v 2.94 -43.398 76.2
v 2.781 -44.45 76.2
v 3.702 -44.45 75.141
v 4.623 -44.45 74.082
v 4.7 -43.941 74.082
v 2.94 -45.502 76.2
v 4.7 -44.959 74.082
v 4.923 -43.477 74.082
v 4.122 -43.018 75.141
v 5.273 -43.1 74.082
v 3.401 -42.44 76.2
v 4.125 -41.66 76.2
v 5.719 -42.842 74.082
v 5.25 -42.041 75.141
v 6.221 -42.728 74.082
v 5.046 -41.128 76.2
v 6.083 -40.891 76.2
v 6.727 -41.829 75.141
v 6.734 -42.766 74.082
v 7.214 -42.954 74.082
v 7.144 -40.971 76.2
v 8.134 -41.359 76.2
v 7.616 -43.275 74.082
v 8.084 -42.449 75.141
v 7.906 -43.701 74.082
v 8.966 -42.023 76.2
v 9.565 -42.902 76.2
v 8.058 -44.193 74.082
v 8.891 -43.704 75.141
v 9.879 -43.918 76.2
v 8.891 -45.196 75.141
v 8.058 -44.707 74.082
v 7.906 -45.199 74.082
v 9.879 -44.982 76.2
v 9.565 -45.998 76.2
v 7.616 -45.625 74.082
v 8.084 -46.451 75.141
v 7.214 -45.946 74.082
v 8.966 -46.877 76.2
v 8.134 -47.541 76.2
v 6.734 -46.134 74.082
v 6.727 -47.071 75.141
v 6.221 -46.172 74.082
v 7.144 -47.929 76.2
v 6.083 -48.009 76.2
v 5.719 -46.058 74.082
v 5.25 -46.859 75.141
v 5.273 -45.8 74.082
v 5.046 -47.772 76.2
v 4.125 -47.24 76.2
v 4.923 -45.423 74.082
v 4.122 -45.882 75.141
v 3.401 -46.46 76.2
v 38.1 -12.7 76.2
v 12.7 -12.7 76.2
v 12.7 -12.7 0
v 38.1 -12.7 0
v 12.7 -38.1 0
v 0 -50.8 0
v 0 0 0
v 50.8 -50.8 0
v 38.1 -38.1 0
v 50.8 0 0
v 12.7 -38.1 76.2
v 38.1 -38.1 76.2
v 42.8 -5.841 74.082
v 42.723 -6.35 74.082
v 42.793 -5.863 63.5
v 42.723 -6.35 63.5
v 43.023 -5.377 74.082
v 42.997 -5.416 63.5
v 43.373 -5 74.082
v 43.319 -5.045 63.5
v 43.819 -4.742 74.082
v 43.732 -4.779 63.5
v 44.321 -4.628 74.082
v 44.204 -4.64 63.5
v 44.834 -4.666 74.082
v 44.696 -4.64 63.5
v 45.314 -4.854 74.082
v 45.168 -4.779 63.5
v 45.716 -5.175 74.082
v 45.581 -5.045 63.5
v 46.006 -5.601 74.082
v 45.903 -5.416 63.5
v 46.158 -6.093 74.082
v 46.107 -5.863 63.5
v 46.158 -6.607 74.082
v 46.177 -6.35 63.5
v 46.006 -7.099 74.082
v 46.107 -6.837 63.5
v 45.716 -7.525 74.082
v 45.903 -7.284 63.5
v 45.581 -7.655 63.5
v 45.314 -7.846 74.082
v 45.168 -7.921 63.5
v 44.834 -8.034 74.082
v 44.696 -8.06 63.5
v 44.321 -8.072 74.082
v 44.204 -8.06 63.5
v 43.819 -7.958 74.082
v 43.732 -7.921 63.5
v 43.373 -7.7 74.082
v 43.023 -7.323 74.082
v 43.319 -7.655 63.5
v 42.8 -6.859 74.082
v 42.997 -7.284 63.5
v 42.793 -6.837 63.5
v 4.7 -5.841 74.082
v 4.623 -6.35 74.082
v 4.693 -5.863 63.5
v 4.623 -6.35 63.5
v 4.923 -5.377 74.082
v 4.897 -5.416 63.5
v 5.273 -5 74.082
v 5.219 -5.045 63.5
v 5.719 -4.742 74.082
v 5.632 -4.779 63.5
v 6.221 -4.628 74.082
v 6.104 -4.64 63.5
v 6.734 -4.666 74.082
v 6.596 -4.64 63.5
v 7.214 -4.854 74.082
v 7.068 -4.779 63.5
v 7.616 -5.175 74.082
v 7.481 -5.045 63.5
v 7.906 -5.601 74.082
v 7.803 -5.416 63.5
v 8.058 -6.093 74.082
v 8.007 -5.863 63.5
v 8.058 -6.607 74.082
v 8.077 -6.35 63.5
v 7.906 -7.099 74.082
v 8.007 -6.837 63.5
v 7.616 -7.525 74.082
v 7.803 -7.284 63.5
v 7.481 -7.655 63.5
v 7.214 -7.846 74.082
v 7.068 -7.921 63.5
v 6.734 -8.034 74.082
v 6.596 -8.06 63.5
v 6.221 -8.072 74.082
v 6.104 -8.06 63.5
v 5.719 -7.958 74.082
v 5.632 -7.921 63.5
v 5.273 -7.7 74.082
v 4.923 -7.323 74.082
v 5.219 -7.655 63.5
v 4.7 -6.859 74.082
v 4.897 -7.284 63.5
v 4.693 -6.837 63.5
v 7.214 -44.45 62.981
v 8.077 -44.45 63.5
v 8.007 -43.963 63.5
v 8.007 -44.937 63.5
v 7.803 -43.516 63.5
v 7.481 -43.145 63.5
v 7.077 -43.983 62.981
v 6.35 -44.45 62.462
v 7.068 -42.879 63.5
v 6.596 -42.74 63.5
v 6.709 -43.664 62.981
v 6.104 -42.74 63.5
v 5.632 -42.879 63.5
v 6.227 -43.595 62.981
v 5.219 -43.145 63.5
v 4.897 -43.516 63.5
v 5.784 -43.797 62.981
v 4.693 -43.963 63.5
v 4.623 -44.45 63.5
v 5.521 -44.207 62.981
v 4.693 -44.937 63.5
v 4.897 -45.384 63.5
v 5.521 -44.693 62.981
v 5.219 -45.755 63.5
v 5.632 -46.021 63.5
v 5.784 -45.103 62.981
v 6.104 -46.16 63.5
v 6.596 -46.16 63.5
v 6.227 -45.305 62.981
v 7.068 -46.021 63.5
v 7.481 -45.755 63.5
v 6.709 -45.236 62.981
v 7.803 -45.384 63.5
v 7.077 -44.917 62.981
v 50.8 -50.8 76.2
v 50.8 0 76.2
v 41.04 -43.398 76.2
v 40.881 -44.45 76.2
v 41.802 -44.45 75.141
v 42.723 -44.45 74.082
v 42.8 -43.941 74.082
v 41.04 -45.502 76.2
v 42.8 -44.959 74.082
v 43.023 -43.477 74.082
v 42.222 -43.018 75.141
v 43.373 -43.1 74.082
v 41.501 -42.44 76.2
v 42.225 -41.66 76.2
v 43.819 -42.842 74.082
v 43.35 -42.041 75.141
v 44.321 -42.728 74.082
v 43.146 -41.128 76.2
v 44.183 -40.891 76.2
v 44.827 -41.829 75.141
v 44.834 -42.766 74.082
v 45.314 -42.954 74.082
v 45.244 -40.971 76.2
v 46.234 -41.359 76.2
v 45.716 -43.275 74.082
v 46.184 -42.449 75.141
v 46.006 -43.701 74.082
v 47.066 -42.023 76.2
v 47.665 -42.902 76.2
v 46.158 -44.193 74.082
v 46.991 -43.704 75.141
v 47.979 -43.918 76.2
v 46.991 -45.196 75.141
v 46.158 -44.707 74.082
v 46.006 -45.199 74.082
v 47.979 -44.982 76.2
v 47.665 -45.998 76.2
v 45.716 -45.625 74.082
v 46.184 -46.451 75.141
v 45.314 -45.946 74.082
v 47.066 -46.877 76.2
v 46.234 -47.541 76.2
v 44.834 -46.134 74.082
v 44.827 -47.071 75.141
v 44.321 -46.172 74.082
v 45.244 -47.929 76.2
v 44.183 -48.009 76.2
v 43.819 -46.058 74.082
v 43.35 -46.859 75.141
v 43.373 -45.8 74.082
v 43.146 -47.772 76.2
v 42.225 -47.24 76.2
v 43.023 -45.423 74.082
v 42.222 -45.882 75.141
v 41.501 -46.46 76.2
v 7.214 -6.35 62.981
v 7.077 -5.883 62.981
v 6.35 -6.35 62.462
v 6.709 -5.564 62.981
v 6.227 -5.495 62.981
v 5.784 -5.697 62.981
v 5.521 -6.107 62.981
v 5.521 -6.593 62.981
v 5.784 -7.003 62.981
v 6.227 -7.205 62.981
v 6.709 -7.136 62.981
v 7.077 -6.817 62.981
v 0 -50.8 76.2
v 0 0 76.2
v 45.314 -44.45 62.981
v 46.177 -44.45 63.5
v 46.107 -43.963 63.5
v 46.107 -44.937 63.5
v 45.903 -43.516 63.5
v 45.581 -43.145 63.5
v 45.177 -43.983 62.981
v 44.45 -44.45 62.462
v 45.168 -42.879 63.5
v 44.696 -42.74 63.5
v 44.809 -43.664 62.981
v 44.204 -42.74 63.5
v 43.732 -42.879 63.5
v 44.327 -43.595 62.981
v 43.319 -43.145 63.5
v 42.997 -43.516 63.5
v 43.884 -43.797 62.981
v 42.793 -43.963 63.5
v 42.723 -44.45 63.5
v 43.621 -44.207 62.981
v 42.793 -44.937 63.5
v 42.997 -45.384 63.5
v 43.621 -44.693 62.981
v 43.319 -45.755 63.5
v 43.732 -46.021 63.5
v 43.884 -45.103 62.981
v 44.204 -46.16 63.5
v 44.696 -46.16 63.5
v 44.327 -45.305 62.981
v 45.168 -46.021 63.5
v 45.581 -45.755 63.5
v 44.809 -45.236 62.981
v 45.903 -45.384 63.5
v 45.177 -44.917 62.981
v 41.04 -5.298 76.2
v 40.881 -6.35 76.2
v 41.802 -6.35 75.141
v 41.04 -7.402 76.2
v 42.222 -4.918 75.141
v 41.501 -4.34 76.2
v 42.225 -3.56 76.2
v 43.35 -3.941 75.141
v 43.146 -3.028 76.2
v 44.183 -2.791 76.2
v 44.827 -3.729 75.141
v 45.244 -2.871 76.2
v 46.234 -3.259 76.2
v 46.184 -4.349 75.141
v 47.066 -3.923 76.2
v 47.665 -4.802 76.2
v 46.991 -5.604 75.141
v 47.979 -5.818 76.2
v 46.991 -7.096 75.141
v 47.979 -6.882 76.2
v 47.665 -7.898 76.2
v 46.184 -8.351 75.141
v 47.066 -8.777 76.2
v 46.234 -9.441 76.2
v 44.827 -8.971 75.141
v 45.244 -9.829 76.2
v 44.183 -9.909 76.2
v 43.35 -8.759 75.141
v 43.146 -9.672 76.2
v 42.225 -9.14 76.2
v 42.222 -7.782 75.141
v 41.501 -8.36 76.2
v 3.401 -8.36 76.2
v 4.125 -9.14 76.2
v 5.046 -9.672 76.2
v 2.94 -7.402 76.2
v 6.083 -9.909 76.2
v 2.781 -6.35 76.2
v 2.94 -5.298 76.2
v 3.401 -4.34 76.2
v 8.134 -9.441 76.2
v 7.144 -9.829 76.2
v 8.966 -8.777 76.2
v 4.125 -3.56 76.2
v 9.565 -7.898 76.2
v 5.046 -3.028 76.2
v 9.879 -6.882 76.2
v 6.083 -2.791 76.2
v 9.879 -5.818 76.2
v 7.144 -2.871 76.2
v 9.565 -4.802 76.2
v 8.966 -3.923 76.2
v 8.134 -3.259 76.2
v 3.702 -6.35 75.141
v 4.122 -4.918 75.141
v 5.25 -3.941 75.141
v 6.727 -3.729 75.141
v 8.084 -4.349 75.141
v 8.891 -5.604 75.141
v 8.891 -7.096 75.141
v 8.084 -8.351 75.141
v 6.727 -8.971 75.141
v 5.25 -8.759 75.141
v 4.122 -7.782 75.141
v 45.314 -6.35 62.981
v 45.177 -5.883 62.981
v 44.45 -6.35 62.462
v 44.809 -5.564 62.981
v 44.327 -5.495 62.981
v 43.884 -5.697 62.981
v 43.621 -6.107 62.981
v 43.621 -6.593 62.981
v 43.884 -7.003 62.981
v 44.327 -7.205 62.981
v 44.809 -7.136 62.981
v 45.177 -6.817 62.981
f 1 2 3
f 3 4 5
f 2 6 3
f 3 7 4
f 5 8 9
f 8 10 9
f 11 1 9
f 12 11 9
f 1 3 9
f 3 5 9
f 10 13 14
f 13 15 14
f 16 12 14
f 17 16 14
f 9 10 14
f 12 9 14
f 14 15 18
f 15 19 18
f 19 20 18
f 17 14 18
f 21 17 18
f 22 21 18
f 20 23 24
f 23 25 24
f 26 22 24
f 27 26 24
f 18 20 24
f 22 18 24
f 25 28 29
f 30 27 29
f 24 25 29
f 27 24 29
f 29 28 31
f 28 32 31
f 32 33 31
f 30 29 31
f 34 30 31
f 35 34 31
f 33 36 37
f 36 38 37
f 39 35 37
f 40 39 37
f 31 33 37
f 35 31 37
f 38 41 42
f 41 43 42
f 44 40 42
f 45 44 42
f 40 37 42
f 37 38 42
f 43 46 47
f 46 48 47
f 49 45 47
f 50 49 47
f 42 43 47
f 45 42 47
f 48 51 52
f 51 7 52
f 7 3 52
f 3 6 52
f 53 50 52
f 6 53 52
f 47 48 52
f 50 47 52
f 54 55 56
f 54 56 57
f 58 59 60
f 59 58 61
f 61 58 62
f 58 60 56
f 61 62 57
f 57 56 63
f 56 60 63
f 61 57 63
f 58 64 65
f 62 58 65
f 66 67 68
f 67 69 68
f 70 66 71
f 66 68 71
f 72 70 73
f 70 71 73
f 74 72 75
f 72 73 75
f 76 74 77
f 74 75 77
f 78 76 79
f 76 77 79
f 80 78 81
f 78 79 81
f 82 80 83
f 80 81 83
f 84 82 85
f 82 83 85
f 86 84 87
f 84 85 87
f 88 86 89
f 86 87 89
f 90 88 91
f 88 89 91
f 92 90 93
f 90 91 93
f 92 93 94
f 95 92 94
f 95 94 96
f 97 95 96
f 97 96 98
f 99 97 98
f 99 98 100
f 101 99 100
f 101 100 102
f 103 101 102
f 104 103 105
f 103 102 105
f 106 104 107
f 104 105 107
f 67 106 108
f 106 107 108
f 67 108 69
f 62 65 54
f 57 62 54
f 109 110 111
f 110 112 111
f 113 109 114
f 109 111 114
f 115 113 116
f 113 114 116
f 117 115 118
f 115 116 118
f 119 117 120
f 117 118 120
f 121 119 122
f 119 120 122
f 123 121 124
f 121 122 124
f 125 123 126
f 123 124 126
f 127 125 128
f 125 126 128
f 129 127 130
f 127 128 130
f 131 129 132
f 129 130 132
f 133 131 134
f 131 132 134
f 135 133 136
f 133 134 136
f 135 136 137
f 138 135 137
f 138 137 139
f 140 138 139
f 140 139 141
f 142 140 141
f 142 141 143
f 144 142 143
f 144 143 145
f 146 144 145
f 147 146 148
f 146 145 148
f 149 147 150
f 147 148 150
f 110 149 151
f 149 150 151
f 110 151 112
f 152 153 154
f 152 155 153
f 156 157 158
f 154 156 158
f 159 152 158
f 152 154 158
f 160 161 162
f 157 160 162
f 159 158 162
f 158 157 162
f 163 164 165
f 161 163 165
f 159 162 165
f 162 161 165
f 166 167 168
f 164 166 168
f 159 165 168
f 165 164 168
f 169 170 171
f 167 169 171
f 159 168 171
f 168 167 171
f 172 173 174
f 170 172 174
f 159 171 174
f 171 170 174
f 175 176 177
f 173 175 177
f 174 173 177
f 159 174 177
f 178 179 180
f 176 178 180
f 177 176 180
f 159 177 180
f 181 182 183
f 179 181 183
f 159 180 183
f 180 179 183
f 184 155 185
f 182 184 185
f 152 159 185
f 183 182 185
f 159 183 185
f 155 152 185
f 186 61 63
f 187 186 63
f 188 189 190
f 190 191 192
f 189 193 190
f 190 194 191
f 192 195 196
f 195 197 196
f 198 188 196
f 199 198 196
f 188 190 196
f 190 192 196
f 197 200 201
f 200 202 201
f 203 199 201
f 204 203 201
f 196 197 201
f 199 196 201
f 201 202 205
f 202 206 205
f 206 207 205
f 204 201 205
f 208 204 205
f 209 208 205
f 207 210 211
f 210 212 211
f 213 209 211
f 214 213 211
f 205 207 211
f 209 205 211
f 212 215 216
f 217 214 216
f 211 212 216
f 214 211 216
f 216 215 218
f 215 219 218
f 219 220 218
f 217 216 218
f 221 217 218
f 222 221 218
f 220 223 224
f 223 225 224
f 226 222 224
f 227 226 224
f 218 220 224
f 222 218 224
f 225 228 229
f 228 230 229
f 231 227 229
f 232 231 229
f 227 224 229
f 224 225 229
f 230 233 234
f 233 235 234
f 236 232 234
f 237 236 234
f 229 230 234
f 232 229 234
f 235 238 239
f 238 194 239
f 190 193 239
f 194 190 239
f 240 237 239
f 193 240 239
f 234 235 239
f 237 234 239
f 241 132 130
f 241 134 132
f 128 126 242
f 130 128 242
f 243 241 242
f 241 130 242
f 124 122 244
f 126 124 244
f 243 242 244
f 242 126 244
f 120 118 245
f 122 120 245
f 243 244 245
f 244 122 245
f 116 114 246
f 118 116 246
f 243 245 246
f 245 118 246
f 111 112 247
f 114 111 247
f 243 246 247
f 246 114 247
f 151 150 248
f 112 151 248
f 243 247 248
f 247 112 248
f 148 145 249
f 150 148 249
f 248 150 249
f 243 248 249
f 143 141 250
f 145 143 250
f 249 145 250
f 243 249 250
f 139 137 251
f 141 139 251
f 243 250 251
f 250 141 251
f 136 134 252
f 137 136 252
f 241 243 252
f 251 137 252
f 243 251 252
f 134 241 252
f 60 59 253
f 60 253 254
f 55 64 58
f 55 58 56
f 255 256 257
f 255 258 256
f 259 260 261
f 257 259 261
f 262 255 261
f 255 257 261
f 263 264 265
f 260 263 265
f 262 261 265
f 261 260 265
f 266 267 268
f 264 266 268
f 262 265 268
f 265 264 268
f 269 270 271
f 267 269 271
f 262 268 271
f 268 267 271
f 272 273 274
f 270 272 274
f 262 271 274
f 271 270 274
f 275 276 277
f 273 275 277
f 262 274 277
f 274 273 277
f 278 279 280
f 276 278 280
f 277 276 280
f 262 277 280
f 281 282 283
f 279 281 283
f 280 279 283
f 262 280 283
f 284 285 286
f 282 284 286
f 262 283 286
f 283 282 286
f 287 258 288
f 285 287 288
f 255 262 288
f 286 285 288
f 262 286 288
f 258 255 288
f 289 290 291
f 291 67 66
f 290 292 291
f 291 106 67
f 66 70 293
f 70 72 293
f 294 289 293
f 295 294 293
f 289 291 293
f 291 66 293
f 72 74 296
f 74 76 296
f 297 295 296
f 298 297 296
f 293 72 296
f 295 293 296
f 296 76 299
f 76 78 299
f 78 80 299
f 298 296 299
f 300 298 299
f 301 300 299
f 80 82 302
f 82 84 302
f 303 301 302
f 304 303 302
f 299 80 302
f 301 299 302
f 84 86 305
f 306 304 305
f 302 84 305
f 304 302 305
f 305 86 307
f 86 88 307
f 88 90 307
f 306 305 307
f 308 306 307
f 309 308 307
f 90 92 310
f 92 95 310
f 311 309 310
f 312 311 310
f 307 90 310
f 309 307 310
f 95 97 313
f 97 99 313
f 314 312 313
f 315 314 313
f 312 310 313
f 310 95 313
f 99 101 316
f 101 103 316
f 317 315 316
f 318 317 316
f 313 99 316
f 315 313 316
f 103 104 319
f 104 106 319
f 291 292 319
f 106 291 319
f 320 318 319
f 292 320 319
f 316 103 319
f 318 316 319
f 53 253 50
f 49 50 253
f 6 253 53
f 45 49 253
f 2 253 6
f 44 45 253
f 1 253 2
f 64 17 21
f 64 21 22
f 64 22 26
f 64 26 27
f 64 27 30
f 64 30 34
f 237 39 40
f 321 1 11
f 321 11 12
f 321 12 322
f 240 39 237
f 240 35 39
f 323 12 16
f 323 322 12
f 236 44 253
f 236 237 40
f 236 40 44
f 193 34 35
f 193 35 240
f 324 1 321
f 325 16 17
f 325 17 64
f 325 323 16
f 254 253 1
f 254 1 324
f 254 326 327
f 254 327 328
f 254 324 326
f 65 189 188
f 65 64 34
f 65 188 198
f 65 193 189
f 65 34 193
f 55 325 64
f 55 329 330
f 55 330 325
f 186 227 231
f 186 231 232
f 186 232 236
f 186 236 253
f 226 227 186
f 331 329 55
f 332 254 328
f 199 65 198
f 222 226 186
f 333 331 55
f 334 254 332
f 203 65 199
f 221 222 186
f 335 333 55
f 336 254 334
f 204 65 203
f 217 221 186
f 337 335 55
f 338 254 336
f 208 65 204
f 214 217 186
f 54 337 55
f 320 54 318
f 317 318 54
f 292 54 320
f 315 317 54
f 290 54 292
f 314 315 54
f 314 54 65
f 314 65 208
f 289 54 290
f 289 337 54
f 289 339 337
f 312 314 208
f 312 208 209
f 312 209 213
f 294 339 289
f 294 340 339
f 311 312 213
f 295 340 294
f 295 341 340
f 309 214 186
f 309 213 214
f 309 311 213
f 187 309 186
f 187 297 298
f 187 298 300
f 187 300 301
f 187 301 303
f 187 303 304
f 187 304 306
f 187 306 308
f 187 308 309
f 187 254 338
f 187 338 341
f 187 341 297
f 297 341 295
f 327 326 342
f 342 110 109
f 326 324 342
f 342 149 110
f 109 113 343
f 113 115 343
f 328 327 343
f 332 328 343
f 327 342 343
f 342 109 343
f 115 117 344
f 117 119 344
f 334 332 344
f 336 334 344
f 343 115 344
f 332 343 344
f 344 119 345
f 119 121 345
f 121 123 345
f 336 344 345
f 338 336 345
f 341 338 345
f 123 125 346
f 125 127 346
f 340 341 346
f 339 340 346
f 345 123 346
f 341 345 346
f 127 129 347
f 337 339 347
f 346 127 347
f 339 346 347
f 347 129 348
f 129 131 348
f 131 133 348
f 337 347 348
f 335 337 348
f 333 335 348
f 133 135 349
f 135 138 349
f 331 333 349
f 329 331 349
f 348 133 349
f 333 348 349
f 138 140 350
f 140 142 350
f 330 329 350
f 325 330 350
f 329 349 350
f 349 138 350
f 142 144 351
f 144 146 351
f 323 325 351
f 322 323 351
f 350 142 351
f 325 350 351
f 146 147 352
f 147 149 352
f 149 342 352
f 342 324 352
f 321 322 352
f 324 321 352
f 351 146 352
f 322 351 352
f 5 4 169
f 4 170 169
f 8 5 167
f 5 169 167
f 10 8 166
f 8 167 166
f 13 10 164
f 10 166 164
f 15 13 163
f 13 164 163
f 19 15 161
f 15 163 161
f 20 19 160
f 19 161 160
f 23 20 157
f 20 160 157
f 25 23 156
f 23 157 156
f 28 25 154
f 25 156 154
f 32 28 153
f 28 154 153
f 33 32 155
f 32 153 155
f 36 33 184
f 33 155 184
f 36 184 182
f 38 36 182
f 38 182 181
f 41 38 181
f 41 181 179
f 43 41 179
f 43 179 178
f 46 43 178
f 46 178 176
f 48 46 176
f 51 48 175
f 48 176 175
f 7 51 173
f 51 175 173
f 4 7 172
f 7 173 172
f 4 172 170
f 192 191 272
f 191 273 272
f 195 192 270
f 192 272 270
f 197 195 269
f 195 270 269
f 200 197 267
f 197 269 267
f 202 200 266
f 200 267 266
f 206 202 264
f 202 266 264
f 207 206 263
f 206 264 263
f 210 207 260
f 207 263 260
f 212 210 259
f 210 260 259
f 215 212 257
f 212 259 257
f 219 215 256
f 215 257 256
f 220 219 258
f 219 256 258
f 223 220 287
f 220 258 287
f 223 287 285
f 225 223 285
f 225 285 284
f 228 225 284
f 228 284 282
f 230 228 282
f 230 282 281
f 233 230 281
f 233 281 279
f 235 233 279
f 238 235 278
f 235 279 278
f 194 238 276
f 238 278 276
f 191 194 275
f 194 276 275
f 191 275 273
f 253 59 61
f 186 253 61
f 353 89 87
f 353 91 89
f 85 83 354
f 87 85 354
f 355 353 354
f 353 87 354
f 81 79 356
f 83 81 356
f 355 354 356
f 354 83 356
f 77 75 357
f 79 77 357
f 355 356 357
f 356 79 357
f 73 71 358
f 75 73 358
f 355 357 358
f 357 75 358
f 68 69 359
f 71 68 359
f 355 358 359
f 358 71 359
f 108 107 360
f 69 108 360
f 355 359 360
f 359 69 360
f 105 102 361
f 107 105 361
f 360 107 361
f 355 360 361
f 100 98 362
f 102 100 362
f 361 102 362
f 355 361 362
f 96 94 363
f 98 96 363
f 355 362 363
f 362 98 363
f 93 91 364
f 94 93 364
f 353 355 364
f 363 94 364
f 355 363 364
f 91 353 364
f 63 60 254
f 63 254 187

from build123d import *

# Parameters (mm, degrees)
F0_W           = 50.8
F0_H           = 50.8
F1_DEPTH       = 76.2
F2_W           = 25.4
F2_H           = 25.4
F3_DEPTH       = 76.201
F5_D           = 3.4544
F5_DEPTH       = 12.7
F5_CSINK_D     = 7.1374
F5_CSINK_ANGLE = 82
F5_TIP         = 1.0378064612


with BuildPart() as f1:
    # F0 (on Top) → F1 (new body)
    with BuildSketch(Plane.XY):
        with Locations((25.4, -25.4)):
            Rectangle(F0_W, F0_H)
    extrude(amount=F1_DEPTH)

    # F2 (on face) → F3 (cut, through all)
    with BuildSketch(Plane.XY.offset(76.2)):
        with Locations((25.4, -25.4)):
            Rectangle(F2_W, F2_H)
    extrude(amount=-F3_DEPTH, mode=Mode.SUBTRACT)

    # F5
    with Locations(Plane.XY.offset(76.2)):
        with Locations((6.35, -6.35), (44.45, -6.35), (44.45, -44.45), (6.35, -44.45)):
            CounterSinkHole(F5_D / 2, F5_CSINK_D / 2, depth=F5_DEPTH, counter_sink_angle=F5_CSINK_ANGLE)
            with Locations((0, 0, -(F5_DEPTH + F5_TIP / 2))):  # 118° drill point
                Cone(0, F5_D / 2, F5_TIP, mode=Mode.SUBTRACT)


solid = f1.part
